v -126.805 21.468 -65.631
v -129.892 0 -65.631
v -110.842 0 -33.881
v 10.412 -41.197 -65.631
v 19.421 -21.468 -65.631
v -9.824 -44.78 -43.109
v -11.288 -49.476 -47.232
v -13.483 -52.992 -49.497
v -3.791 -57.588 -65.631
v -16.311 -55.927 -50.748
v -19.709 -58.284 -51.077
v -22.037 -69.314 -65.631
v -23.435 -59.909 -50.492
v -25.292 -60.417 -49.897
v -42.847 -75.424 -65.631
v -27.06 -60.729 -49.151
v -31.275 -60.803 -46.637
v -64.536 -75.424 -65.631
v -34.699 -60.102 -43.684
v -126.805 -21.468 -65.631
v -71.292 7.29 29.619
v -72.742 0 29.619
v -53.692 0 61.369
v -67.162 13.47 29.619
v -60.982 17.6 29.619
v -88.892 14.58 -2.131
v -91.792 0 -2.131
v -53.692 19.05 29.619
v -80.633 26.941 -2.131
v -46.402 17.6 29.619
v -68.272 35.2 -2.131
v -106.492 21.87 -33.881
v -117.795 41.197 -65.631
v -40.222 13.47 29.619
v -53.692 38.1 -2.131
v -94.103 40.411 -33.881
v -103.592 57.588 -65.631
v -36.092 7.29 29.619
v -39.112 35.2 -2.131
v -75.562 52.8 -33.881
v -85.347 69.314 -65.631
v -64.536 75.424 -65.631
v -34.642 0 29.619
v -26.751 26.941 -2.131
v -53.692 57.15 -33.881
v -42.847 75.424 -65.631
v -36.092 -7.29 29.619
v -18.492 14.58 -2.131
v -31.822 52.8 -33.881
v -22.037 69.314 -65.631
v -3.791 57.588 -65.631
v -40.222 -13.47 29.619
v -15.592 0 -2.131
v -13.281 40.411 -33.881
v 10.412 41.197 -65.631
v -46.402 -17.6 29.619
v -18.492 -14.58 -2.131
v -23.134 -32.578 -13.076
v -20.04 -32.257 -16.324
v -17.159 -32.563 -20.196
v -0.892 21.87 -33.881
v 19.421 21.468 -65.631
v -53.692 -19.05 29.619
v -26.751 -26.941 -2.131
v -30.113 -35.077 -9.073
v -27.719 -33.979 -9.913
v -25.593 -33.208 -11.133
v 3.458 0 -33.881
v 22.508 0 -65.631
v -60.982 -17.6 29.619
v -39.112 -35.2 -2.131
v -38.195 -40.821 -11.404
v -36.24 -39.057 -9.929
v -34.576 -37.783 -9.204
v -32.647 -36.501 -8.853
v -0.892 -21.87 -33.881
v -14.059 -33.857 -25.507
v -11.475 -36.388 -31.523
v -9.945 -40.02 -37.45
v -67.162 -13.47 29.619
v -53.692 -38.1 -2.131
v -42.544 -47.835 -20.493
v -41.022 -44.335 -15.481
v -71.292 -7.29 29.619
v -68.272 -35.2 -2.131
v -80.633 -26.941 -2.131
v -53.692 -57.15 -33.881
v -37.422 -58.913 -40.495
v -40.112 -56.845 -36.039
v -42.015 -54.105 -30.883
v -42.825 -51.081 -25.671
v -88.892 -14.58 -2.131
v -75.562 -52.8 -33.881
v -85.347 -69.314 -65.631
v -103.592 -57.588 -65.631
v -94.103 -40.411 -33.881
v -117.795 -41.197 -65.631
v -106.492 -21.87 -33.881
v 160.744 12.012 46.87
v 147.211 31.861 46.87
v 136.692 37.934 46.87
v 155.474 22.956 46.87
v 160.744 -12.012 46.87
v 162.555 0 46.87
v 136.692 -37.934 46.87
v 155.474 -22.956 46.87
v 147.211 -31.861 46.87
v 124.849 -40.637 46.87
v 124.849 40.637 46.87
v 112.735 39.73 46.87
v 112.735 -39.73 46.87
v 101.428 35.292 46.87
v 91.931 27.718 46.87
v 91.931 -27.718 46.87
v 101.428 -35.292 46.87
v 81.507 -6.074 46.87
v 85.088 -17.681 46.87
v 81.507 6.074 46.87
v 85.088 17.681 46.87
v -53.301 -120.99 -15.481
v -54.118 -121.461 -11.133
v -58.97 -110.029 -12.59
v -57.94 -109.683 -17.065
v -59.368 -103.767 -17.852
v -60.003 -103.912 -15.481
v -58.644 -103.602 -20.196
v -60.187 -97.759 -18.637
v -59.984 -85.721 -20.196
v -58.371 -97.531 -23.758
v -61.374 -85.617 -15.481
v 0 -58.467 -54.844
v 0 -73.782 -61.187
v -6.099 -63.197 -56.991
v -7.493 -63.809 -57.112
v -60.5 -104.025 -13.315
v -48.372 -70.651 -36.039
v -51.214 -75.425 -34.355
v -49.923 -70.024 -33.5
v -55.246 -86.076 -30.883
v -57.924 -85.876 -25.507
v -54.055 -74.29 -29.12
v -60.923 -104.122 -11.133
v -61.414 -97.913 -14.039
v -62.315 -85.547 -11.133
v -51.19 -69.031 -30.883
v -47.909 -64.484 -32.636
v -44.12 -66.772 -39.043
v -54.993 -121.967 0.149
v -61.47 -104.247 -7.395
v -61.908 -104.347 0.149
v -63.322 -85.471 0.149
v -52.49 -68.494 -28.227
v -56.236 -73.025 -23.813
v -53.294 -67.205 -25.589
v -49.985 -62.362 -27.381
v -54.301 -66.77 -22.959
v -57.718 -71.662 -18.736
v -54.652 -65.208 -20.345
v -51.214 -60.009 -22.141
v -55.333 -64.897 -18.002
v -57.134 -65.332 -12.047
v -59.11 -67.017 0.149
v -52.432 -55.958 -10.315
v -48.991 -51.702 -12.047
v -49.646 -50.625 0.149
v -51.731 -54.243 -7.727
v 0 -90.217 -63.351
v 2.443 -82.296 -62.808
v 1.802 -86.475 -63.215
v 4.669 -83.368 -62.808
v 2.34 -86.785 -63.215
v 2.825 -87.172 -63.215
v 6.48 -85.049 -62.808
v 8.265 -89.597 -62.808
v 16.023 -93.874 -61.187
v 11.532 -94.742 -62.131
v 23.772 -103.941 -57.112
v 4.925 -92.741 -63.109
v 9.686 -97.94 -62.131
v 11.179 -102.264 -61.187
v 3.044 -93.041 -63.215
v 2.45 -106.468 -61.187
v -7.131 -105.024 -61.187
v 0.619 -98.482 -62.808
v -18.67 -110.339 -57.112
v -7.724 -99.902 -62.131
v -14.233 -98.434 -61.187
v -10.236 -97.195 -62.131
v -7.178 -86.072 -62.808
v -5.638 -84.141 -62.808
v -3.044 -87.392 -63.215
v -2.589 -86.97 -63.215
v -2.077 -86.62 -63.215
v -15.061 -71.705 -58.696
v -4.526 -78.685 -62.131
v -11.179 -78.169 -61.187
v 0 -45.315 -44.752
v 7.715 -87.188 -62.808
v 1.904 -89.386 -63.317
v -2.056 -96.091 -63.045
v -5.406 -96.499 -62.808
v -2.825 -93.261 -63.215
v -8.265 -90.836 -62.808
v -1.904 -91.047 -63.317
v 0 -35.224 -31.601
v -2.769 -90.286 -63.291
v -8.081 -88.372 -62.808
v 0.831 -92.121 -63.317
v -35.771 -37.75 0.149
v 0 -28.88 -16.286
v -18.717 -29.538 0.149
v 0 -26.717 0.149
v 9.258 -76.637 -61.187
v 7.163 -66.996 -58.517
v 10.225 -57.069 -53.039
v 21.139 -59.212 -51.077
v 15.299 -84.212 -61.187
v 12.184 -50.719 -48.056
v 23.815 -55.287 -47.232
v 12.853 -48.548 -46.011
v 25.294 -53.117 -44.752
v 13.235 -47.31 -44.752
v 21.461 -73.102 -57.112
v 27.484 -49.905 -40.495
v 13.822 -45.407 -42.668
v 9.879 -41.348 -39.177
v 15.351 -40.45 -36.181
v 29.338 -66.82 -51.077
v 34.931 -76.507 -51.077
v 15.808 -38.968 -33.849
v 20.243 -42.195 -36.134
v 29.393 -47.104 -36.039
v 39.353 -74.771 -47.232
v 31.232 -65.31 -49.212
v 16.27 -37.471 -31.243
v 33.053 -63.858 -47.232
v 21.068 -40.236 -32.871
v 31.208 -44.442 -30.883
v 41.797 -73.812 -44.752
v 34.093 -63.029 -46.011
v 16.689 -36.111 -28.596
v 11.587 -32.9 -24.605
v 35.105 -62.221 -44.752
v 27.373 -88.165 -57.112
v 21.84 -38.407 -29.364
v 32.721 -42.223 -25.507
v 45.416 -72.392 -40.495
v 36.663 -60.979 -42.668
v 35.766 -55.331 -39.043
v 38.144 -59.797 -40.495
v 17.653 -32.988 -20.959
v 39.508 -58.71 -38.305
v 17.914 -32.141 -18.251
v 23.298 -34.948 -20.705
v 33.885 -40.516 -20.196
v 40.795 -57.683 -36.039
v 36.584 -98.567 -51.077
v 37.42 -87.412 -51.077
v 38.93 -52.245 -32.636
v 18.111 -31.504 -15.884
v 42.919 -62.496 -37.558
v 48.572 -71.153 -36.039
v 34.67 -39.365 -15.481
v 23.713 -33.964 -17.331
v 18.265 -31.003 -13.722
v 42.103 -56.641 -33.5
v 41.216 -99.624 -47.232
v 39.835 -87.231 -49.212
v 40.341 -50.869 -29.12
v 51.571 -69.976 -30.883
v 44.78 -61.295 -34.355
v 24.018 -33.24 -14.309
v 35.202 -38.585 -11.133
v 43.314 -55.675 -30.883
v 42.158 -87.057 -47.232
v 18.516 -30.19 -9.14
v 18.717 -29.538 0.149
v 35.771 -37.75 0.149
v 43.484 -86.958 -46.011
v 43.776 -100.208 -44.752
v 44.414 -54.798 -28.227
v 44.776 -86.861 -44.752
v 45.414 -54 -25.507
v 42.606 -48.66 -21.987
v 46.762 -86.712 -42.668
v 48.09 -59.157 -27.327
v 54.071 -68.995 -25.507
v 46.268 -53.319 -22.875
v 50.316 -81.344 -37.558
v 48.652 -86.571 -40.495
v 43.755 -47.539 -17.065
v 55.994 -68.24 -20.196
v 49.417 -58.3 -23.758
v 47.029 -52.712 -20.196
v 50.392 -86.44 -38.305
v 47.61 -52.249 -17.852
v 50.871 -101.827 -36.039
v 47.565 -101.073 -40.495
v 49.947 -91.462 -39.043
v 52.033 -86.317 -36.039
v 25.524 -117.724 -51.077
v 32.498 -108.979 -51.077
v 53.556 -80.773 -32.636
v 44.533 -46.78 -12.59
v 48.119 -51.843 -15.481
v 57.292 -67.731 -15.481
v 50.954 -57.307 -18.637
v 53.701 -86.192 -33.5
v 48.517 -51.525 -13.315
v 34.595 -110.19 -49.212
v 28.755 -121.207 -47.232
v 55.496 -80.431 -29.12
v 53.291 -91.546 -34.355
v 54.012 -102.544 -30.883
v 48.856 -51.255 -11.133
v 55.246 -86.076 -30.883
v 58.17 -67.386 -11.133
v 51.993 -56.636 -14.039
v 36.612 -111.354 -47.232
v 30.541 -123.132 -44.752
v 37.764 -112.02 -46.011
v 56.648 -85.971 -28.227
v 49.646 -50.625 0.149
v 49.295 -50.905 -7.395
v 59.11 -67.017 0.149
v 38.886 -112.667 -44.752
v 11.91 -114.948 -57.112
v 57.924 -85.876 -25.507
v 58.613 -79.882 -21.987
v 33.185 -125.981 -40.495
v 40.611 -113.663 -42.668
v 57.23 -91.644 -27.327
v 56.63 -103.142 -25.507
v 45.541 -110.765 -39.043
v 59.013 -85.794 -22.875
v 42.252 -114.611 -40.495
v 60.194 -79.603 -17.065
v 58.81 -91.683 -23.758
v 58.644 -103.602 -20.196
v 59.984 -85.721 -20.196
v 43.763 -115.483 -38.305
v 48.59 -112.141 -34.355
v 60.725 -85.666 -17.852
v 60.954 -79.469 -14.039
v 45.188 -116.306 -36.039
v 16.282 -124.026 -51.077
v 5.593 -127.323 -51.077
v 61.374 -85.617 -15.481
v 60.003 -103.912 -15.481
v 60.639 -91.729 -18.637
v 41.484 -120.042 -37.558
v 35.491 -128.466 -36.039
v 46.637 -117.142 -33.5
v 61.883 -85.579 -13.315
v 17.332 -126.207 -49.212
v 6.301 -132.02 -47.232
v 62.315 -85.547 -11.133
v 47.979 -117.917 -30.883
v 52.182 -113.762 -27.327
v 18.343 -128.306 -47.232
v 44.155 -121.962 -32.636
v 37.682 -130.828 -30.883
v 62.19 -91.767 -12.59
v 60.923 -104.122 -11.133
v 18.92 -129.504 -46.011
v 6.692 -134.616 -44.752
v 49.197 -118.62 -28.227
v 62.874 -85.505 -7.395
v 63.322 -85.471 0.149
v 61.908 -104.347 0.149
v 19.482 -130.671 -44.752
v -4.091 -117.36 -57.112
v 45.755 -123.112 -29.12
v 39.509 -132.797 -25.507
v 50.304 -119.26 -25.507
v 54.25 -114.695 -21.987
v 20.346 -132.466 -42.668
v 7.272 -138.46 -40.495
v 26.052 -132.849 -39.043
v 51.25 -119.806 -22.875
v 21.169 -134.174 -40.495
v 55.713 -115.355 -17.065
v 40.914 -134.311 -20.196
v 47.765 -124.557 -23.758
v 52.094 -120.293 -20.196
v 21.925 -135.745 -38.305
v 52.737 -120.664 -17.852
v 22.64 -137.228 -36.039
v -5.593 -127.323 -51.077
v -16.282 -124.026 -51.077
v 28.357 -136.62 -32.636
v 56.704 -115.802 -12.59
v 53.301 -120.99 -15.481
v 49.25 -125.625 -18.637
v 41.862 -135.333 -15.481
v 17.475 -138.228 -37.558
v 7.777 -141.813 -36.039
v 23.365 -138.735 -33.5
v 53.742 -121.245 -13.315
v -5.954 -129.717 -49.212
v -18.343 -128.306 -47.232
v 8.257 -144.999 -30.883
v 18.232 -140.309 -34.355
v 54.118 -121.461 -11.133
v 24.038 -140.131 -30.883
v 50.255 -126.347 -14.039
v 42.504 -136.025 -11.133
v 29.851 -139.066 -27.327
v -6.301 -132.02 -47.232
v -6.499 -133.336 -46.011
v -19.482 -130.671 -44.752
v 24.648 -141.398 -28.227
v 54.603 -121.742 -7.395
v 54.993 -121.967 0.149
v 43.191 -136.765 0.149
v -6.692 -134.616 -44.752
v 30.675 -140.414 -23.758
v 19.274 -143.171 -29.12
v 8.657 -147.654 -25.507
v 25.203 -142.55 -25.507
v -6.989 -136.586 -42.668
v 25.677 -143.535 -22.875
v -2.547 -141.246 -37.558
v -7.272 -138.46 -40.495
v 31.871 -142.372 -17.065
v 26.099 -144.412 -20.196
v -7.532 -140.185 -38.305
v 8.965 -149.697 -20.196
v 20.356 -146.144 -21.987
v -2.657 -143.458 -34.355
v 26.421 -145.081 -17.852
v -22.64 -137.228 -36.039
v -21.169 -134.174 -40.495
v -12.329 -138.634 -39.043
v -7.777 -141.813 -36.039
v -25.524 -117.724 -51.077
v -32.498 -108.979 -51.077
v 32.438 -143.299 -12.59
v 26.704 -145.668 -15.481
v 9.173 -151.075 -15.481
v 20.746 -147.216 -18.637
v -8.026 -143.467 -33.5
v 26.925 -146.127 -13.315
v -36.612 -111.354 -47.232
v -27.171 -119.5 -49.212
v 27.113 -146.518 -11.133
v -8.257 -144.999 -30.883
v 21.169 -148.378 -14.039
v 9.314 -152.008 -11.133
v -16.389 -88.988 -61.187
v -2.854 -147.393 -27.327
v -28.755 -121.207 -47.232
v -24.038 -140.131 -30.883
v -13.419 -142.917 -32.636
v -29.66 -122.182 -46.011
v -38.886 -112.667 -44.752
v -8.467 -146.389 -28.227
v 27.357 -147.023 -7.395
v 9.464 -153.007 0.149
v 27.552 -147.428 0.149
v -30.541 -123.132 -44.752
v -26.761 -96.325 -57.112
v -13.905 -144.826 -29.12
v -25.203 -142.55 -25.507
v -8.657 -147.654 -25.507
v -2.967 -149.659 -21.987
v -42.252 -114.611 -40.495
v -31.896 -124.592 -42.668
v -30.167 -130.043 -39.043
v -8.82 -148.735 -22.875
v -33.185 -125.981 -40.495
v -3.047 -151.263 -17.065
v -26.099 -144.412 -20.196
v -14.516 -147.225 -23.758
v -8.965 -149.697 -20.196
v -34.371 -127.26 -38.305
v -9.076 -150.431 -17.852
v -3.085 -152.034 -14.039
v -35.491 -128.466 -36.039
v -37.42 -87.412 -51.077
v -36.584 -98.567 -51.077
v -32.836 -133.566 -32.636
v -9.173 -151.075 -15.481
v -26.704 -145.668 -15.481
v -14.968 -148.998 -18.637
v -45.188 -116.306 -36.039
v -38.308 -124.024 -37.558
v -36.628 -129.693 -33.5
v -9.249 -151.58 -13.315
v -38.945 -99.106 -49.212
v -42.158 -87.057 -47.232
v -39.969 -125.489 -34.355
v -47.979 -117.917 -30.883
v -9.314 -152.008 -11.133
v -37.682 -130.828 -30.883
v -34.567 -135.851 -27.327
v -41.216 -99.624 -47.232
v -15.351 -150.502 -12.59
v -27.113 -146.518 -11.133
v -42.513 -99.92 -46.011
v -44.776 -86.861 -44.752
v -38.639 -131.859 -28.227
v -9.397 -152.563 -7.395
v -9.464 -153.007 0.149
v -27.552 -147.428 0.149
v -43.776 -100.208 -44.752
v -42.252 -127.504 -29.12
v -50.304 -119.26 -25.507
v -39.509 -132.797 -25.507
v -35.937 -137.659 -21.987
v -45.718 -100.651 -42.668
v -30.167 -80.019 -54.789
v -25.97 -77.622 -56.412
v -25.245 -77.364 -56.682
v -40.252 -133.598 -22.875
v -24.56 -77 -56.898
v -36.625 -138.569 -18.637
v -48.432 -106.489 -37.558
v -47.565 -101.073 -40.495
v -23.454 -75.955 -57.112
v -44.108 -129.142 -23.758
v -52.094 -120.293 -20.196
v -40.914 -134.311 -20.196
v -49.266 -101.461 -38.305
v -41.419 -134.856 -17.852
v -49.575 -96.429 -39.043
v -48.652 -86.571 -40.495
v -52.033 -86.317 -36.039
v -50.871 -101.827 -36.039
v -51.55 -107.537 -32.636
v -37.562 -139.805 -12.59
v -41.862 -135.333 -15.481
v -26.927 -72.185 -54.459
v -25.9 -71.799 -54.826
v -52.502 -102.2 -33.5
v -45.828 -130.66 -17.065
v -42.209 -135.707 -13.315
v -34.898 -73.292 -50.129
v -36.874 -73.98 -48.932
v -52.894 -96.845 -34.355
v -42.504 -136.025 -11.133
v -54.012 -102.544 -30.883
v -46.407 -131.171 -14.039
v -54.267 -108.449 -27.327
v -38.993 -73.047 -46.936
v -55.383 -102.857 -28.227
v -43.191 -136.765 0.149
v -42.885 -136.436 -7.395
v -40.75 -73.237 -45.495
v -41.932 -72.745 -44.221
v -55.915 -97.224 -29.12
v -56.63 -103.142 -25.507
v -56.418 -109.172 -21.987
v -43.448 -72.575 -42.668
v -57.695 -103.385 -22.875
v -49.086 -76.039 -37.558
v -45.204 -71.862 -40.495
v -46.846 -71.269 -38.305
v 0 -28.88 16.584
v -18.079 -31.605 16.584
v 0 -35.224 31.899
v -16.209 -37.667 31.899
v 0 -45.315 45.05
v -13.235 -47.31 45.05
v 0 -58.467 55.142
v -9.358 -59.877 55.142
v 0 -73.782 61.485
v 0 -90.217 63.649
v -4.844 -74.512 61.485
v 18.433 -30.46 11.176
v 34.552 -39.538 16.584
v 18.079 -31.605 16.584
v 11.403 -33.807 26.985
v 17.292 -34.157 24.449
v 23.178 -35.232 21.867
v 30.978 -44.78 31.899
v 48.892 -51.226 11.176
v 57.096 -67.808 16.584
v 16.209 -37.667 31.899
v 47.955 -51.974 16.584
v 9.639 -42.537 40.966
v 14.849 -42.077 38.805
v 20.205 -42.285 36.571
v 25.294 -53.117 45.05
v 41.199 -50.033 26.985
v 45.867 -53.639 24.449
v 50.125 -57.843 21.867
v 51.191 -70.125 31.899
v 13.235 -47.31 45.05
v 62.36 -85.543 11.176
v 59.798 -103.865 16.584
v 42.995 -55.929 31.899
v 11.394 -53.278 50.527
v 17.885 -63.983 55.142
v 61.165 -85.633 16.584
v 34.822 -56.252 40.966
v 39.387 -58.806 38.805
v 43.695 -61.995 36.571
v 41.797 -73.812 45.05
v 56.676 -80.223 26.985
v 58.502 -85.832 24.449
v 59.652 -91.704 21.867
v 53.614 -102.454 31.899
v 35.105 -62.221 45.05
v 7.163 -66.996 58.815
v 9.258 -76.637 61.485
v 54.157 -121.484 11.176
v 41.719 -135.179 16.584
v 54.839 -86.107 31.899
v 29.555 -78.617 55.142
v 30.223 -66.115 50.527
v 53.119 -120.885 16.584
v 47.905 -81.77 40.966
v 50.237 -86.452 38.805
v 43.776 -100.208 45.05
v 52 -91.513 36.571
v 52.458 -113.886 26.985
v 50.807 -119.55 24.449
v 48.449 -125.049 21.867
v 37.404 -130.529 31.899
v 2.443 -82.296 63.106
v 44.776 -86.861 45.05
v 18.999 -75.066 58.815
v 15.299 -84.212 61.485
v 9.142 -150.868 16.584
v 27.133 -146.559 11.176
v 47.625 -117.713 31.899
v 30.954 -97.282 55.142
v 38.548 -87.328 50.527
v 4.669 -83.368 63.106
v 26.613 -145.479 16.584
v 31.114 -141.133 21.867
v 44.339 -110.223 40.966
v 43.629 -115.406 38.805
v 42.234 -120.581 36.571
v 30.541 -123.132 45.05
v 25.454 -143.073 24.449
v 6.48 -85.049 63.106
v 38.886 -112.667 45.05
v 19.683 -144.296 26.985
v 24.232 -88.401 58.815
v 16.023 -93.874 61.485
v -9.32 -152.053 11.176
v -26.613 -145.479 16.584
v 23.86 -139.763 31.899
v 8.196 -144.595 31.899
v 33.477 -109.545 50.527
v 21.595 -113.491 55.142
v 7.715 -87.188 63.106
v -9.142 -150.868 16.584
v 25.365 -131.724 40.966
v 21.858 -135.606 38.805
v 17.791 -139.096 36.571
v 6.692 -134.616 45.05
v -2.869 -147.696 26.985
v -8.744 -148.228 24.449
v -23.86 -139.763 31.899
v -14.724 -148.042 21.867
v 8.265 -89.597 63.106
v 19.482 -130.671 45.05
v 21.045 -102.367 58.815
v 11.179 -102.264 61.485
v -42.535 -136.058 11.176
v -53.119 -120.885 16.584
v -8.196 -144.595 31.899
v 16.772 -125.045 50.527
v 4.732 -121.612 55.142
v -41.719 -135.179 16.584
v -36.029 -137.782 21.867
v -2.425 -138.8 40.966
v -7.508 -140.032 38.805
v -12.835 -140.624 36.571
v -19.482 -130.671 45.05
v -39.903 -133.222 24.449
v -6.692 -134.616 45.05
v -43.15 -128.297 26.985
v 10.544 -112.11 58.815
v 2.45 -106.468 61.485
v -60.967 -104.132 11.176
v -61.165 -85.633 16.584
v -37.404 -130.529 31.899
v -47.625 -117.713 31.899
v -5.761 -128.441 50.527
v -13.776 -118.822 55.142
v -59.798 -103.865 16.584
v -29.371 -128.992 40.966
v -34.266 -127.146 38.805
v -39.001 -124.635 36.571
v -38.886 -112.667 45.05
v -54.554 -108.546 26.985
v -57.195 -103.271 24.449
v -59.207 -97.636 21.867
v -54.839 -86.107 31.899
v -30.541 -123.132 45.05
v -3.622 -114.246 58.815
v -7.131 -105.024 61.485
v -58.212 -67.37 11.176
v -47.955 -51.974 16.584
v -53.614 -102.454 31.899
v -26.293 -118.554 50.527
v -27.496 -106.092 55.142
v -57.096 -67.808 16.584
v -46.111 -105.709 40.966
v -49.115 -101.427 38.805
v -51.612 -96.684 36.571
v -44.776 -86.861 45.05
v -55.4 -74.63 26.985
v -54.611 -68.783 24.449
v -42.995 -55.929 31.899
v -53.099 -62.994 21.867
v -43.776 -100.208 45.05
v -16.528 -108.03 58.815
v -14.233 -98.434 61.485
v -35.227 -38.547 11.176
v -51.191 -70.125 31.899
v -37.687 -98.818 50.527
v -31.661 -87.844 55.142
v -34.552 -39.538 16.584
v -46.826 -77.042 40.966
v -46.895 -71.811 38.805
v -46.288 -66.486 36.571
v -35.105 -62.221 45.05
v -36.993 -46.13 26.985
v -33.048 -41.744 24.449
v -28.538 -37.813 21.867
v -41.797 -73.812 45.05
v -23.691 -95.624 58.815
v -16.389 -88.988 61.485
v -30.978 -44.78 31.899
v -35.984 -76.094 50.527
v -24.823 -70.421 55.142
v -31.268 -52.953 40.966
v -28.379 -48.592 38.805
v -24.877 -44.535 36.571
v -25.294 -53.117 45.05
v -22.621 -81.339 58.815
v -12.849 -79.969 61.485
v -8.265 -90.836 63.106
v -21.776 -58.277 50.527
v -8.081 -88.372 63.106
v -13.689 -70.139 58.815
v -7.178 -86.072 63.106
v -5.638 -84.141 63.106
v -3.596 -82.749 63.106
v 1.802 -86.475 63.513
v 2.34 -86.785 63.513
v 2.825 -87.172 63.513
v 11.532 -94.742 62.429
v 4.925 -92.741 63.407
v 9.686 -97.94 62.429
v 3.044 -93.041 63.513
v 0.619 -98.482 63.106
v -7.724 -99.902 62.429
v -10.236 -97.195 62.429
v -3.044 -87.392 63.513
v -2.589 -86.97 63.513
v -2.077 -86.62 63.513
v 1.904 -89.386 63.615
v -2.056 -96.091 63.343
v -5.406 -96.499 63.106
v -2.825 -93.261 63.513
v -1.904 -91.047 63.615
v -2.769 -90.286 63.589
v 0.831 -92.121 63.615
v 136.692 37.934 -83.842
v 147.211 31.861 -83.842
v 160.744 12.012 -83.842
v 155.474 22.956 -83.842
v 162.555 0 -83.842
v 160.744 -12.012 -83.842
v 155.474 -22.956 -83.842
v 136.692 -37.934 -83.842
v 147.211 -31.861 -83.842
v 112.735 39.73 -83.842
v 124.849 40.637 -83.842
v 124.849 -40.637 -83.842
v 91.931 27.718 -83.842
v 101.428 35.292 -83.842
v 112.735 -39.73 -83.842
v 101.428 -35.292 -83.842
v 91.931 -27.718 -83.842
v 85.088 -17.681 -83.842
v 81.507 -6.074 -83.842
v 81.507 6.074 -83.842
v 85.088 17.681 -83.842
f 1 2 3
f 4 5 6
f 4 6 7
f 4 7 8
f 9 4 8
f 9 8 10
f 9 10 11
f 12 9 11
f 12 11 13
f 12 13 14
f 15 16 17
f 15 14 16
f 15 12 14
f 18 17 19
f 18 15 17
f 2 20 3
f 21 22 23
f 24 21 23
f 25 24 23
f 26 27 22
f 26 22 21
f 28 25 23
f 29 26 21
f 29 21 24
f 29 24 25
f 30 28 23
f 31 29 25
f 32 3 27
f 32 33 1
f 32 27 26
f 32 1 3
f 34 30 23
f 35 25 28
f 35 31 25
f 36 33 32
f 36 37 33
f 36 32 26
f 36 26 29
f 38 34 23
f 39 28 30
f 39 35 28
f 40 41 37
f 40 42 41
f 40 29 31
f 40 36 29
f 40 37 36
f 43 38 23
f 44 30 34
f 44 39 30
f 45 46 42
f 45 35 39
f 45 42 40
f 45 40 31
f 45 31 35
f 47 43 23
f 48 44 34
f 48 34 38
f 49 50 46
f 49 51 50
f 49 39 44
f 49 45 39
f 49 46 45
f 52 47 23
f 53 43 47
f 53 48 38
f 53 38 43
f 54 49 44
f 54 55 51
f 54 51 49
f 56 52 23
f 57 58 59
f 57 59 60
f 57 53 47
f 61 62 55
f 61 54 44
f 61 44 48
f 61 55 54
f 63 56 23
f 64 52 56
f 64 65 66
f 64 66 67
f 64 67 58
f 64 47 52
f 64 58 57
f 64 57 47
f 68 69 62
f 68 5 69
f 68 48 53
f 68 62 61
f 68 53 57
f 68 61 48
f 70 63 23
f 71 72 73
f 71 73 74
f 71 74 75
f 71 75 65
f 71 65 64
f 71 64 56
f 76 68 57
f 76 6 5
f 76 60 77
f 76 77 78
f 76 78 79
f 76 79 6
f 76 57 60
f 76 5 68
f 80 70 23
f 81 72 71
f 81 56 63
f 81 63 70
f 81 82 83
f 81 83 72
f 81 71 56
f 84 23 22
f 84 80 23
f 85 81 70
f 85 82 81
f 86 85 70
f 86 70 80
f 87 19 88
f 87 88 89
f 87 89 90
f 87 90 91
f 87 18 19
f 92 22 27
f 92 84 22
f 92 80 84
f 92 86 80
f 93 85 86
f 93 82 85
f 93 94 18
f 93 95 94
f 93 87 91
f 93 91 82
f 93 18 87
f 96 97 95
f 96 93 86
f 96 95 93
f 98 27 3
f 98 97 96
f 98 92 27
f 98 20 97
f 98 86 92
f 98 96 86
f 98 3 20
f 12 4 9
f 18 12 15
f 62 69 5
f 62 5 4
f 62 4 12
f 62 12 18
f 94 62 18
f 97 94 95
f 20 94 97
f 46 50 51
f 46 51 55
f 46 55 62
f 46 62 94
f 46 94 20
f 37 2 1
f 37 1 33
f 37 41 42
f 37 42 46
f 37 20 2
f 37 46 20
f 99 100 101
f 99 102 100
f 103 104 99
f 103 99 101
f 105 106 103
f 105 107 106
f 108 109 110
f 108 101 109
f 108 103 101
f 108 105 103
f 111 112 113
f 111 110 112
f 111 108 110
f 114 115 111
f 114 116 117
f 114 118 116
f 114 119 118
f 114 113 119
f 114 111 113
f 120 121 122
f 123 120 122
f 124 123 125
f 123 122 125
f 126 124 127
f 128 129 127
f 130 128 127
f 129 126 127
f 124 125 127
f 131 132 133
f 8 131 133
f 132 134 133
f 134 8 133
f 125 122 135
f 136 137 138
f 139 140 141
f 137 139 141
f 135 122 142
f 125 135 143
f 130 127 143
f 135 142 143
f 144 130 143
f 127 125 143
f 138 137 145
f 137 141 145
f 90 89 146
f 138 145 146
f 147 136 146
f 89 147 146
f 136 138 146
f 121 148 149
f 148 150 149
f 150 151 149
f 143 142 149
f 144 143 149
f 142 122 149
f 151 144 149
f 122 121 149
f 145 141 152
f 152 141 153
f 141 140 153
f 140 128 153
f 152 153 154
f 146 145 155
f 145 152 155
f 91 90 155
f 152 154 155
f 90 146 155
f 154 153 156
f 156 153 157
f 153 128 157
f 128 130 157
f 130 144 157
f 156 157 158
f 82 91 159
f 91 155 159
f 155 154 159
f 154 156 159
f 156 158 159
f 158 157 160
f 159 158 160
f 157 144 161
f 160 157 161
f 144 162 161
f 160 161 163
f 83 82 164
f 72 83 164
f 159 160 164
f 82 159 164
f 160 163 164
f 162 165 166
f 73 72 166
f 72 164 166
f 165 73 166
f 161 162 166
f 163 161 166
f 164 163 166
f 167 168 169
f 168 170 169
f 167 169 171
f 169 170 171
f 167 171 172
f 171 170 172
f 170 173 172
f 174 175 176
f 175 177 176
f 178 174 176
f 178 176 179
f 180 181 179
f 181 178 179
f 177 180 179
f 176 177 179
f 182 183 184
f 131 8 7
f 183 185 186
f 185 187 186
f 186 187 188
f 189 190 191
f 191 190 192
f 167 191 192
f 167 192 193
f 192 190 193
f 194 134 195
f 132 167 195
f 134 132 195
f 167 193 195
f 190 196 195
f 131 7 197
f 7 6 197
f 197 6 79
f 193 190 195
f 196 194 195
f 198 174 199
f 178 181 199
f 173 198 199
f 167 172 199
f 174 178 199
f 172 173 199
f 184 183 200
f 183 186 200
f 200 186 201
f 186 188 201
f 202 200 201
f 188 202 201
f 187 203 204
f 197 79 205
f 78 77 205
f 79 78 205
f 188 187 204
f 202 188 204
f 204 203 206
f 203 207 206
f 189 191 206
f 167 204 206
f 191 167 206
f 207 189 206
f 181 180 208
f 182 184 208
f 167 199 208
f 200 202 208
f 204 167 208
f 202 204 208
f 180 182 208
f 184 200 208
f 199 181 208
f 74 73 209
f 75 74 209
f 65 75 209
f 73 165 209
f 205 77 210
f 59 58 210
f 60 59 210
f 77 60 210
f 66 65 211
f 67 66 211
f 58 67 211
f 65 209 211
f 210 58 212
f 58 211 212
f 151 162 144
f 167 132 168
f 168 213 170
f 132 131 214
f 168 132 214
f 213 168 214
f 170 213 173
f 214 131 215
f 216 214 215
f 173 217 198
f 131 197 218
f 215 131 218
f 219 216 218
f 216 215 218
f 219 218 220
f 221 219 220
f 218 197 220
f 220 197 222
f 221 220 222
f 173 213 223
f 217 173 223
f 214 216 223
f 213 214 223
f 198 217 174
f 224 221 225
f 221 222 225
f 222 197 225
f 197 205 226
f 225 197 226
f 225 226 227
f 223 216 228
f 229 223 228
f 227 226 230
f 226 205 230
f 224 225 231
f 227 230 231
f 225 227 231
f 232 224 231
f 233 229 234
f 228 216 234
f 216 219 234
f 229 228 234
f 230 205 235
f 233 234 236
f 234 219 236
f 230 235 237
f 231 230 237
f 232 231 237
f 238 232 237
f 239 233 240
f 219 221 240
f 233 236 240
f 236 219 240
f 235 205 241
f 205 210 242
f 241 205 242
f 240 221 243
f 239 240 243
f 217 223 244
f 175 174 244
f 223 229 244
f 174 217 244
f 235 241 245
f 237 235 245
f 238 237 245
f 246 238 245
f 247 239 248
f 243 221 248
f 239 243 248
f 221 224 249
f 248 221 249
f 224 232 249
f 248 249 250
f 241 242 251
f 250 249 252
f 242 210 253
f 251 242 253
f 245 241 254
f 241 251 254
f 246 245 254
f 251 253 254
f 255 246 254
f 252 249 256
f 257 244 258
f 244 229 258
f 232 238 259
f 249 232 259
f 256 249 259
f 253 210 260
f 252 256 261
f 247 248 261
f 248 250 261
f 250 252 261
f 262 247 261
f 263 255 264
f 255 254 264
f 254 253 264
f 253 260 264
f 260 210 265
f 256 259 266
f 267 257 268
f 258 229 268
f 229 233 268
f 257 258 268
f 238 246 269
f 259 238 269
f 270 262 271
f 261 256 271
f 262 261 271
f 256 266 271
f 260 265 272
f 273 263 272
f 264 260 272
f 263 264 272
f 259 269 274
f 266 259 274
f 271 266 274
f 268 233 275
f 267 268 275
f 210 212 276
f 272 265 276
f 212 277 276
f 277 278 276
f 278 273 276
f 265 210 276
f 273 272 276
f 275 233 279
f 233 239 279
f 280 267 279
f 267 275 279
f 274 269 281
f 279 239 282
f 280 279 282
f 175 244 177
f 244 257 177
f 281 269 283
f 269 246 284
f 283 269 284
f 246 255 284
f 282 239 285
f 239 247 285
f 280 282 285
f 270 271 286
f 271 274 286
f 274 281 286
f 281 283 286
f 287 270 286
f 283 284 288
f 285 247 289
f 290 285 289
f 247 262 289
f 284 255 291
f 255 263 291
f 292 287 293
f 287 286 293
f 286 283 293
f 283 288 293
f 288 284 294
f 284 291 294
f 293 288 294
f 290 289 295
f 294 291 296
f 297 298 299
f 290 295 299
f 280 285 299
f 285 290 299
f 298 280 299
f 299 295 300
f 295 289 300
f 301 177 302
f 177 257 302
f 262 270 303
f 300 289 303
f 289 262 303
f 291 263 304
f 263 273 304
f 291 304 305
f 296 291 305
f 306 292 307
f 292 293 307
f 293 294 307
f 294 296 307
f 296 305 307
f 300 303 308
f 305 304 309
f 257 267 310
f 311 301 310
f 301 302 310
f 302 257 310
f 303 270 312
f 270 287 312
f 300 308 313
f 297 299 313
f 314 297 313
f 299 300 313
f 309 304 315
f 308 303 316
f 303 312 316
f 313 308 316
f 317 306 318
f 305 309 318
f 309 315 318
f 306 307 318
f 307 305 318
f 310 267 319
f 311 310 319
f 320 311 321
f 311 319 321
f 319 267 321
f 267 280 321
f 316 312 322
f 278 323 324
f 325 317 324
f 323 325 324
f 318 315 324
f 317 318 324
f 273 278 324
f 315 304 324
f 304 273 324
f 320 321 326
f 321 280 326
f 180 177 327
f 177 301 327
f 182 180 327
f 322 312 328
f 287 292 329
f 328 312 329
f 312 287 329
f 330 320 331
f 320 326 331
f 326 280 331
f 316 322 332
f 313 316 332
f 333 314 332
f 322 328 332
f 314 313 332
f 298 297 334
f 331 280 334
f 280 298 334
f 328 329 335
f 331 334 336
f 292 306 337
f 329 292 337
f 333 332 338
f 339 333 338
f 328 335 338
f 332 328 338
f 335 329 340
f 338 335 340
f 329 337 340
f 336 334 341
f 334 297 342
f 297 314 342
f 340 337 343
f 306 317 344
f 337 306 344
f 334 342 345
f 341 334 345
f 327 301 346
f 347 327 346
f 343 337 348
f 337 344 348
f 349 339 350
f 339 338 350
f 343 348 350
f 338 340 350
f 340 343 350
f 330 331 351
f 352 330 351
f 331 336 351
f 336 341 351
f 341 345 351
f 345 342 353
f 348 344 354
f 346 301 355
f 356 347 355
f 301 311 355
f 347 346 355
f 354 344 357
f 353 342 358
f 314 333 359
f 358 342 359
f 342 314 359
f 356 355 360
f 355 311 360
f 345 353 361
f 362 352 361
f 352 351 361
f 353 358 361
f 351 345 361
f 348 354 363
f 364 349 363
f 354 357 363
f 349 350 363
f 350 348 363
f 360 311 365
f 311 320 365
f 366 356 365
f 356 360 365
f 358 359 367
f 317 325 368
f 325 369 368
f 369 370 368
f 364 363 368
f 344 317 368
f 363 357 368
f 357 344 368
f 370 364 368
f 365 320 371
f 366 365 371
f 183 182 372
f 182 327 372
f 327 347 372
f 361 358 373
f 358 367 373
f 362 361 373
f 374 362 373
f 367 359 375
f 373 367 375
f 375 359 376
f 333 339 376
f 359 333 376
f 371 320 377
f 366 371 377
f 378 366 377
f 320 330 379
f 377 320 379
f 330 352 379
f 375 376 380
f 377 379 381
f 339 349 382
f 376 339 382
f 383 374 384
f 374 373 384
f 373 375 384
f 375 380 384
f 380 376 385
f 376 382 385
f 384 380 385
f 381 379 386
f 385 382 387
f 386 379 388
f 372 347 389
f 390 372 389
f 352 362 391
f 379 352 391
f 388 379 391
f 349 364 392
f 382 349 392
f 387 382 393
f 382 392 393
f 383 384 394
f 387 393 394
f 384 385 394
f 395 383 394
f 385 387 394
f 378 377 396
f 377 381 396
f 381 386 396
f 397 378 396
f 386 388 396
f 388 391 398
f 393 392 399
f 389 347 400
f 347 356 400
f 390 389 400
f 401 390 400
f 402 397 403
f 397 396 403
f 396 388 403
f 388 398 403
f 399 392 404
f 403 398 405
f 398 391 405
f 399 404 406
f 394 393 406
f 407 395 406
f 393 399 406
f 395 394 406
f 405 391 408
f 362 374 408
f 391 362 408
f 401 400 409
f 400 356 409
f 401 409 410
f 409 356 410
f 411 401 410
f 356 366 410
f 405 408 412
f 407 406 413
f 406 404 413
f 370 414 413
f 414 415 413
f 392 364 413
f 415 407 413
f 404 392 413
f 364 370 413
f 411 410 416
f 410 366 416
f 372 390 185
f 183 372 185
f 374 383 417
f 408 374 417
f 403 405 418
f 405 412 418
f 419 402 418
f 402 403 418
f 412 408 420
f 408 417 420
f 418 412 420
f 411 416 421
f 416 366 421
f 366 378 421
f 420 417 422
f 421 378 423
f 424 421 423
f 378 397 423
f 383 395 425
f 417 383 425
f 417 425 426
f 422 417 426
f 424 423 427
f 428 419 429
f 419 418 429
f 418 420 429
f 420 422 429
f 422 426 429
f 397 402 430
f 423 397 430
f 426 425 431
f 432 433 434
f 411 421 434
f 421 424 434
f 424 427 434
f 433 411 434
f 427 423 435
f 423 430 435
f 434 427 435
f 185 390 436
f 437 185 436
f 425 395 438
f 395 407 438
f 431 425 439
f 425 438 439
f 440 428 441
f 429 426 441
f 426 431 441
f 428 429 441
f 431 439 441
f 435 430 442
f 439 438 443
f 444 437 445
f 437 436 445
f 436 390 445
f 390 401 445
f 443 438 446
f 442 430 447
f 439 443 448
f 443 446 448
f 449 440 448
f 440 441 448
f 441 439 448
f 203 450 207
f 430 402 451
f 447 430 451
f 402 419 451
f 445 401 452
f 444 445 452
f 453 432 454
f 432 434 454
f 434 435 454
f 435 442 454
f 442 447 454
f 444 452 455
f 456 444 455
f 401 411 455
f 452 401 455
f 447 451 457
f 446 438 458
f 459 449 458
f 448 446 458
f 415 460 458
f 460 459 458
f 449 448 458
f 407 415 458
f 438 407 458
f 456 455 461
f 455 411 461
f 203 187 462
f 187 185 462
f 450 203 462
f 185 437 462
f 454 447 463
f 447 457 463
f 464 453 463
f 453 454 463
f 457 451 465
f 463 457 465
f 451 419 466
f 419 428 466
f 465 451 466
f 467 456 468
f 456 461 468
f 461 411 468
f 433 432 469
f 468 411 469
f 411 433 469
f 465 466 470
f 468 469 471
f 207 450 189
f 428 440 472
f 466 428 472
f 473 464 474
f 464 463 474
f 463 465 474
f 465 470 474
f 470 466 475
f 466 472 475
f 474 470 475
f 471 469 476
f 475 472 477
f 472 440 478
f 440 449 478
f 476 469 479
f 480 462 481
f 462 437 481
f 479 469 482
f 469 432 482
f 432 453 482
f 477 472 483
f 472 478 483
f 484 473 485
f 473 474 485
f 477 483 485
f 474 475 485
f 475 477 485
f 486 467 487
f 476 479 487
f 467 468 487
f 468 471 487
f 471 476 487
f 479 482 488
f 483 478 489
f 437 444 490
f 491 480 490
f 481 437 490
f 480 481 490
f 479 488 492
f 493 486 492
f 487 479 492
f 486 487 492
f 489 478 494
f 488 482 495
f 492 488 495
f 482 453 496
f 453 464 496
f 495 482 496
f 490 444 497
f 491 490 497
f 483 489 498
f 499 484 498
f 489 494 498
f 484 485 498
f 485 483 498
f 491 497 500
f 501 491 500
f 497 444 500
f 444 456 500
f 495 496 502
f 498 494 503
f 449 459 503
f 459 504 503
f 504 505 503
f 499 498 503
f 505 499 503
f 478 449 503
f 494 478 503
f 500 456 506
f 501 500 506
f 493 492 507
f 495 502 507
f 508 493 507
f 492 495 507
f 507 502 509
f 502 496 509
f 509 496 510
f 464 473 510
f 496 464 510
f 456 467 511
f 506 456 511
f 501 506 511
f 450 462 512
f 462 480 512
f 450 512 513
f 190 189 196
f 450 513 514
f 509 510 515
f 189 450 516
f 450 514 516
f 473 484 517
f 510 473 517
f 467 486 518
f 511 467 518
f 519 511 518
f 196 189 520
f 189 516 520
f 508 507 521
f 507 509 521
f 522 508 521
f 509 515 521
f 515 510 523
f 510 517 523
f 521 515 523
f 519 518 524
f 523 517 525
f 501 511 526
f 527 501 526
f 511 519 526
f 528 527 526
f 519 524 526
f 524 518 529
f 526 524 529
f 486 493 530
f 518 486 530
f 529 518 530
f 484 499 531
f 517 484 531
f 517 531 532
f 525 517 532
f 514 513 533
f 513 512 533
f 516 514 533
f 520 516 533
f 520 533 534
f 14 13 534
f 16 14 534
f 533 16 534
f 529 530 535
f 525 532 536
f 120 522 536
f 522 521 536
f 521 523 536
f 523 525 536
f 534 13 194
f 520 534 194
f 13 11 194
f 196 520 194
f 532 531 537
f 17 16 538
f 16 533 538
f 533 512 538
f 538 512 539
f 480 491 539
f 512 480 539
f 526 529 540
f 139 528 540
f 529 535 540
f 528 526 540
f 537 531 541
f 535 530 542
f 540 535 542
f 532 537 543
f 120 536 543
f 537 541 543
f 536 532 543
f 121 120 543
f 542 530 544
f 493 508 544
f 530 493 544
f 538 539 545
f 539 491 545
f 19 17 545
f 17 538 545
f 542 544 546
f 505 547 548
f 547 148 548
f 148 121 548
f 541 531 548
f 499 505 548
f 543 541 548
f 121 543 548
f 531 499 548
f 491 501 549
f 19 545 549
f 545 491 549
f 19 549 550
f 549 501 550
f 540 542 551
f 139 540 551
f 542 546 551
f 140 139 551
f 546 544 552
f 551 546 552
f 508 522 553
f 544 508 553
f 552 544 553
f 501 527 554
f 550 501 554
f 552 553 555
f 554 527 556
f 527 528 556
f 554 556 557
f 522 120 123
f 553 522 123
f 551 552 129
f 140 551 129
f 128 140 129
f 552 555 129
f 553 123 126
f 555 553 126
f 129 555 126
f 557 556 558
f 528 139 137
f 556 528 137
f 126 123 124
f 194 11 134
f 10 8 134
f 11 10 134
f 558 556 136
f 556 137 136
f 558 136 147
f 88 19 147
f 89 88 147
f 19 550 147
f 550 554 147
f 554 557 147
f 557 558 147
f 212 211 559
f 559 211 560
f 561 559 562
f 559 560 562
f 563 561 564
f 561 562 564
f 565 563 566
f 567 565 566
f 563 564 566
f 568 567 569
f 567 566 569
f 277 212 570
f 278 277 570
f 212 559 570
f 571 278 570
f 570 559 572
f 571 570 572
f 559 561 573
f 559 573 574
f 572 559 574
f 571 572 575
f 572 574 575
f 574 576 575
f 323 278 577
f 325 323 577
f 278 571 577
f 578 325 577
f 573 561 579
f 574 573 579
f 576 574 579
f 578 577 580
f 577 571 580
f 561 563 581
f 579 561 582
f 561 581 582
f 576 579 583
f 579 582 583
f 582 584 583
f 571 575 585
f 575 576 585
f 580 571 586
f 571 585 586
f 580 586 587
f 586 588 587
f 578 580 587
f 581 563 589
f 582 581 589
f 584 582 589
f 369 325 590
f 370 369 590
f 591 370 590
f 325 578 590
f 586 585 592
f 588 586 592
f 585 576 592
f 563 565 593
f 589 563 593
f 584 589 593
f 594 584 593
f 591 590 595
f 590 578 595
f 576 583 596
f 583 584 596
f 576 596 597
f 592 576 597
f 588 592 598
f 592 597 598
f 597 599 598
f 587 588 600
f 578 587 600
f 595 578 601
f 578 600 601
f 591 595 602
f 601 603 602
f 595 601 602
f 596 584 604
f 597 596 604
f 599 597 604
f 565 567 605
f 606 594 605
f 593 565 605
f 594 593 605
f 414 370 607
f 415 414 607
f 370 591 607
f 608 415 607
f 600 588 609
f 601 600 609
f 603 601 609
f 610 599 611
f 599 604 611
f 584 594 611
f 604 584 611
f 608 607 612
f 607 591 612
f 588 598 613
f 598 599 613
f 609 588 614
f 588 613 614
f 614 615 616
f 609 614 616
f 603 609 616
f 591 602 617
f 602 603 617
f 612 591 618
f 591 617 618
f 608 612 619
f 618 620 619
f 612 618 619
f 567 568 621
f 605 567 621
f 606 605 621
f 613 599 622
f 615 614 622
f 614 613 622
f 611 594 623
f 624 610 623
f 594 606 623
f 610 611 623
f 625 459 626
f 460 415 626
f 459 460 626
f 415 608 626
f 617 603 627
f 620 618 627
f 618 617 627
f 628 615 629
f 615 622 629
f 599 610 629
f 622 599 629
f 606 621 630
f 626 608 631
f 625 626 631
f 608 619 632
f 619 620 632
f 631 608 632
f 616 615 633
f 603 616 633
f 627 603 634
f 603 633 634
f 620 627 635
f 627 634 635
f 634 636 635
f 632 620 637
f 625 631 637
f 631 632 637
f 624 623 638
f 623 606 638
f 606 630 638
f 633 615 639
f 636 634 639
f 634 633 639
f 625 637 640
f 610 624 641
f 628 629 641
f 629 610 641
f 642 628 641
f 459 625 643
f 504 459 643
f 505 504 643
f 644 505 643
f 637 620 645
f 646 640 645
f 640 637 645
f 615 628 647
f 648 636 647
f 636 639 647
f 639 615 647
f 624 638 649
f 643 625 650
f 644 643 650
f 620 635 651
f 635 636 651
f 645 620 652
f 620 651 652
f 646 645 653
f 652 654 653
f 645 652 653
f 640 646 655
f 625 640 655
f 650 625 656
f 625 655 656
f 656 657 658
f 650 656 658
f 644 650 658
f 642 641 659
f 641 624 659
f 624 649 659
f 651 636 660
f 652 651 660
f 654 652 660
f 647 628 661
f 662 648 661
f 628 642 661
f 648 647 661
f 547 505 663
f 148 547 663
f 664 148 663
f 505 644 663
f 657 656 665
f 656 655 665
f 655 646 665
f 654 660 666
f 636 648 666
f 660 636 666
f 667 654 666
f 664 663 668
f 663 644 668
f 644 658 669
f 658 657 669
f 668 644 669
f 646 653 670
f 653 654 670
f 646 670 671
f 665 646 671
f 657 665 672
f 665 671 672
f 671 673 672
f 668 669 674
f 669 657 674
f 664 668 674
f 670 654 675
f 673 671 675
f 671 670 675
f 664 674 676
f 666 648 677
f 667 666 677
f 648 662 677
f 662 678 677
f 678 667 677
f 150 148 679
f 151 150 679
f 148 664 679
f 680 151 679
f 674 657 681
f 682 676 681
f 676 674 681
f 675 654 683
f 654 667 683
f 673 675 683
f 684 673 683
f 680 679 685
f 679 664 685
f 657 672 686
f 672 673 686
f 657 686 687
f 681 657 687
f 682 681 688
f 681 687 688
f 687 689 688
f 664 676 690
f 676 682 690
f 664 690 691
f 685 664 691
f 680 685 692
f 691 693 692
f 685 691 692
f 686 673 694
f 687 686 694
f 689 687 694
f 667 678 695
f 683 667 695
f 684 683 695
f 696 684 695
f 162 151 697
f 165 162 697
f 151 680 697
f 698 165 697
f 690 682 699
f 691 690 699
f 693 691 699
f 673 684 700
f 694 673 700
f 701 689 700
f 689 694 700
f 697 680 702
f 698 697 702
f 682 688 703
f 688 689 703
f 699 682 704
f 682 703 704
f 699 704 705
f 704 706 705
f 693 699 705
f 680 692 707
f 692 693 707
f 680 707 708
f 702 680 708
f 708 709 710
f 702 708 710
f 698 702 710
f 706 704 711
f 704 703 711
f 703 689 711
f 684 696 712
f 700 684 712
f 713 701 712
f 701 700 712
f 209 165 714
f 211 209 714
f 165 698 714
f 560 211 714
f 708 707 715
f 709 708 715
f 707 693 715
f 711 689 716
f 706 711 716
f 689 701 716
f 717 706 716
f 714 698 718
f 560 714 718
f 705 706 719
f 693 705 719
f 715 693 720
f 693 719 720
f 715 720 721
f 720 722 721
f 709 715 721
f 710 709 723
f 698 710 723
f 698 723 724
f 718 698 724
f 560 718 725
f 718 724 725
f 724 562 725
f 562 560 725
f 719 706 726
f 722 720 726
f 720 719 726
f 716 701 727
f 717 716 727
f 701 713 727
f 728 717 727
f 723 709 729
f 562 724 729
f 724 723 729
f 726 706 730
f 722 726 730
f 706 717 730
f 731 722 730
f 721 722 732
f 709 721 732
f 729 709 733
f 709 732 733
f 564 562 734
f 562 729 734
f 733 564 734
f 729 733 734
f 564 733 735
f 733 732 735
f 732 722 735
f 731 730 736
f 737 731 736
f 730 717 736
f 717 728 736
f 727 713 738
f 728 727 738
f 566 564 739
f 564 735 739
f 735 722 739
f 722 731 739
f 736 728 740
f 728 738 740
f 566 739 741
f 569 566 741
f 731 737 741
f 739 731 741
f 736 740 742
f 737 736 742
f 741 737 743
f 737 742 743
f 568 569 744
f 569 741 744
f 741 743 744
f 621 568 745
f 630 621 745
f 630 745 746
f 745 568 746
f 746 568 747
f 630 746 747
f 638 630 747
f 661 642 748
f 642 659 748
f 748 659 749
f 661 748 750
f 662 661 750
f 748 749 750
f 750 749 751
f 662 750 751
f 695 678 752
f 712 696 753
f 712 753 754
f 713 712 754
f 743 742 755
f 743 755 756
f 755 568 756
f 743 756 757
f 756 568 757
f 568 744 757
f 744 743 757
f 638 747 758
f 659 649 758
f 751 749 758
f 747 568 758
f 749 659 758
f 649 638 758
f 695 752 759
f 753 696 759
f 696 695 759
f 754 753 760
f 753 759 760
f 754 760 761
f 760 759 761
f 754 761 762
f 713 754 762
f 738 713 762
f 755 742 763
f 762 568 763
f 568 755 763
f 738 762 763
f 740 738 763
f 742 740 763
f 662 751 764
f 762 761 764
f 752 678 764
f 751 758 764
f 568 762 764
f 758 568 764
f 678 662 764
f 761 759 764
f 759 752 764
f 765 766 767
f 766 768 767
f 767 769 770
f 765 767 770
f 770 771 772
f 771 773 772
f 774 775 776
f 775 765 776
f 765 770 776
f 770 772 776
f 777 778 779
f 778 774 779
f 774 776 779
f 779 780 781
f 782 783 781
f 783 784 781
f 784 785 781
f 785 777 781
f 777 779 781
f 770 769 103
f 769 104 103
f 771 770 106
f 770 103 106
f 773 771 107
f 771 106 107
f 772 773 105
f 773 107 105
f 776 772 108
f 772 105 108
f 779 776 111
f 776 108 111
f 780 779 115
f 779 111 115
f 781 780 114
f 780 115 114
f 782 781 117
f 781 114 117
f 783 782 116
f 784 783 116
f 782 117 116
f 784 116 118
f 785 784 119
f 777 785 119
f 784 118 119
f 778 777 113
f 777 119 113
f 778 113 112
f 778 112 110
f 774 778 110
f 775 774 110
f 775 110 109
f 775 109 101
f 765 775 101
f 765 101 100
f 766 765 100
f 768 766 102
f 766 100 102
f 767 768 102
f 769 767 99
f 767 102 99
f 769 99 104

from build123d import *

# Parameters (mm, degrees)
F4_W = 40.751412
F4_H = 130.712126


with BuildPart() as f1:
    # F0 (on Front) → F1 (revolve)
    with BuildSketch(Plane.XZ):
        Polygon((-53.691887, -65.631457), (-53.691887, 61.368543), (-129.891887, -65.631457), align=None)
    revolve(axis=Axis((-53.691887, 0, -2.131457), (0, 0, -1)))

    # F2 (on Right) → F3 (revolve)
    with BuildSketch(Plane.YZ):
        with BuildLine():
            ThreePointArc((-26.716555, 0.148972), (-45.315274, 45.050253), (-90.216555, 63.648972))
            Line((-90.216555, 63.648972), (-90.216555, -63.351028))
            ThreePointArc((-90.216555, -63.351028), (-45.315274, -44.752308), (-26.716555, 0.148972))
        make_face()
    revolve(axis=Axis((0, -90.216555, 0.148972), (0, 0, -1)))


with BuildPart() as f5:
    # F4 (on Front) → F5 (revolve)
    with BuildSketch(Plane.XZ):
        with Locations((142.179109, -18.486349)):
            Rectangle(F4_W, F4_H)
    revolve(axis=Axis((121.803403, 0, -18.486349), (0, 0, -1)))


solid = Compound([f1.part, f5.part])
